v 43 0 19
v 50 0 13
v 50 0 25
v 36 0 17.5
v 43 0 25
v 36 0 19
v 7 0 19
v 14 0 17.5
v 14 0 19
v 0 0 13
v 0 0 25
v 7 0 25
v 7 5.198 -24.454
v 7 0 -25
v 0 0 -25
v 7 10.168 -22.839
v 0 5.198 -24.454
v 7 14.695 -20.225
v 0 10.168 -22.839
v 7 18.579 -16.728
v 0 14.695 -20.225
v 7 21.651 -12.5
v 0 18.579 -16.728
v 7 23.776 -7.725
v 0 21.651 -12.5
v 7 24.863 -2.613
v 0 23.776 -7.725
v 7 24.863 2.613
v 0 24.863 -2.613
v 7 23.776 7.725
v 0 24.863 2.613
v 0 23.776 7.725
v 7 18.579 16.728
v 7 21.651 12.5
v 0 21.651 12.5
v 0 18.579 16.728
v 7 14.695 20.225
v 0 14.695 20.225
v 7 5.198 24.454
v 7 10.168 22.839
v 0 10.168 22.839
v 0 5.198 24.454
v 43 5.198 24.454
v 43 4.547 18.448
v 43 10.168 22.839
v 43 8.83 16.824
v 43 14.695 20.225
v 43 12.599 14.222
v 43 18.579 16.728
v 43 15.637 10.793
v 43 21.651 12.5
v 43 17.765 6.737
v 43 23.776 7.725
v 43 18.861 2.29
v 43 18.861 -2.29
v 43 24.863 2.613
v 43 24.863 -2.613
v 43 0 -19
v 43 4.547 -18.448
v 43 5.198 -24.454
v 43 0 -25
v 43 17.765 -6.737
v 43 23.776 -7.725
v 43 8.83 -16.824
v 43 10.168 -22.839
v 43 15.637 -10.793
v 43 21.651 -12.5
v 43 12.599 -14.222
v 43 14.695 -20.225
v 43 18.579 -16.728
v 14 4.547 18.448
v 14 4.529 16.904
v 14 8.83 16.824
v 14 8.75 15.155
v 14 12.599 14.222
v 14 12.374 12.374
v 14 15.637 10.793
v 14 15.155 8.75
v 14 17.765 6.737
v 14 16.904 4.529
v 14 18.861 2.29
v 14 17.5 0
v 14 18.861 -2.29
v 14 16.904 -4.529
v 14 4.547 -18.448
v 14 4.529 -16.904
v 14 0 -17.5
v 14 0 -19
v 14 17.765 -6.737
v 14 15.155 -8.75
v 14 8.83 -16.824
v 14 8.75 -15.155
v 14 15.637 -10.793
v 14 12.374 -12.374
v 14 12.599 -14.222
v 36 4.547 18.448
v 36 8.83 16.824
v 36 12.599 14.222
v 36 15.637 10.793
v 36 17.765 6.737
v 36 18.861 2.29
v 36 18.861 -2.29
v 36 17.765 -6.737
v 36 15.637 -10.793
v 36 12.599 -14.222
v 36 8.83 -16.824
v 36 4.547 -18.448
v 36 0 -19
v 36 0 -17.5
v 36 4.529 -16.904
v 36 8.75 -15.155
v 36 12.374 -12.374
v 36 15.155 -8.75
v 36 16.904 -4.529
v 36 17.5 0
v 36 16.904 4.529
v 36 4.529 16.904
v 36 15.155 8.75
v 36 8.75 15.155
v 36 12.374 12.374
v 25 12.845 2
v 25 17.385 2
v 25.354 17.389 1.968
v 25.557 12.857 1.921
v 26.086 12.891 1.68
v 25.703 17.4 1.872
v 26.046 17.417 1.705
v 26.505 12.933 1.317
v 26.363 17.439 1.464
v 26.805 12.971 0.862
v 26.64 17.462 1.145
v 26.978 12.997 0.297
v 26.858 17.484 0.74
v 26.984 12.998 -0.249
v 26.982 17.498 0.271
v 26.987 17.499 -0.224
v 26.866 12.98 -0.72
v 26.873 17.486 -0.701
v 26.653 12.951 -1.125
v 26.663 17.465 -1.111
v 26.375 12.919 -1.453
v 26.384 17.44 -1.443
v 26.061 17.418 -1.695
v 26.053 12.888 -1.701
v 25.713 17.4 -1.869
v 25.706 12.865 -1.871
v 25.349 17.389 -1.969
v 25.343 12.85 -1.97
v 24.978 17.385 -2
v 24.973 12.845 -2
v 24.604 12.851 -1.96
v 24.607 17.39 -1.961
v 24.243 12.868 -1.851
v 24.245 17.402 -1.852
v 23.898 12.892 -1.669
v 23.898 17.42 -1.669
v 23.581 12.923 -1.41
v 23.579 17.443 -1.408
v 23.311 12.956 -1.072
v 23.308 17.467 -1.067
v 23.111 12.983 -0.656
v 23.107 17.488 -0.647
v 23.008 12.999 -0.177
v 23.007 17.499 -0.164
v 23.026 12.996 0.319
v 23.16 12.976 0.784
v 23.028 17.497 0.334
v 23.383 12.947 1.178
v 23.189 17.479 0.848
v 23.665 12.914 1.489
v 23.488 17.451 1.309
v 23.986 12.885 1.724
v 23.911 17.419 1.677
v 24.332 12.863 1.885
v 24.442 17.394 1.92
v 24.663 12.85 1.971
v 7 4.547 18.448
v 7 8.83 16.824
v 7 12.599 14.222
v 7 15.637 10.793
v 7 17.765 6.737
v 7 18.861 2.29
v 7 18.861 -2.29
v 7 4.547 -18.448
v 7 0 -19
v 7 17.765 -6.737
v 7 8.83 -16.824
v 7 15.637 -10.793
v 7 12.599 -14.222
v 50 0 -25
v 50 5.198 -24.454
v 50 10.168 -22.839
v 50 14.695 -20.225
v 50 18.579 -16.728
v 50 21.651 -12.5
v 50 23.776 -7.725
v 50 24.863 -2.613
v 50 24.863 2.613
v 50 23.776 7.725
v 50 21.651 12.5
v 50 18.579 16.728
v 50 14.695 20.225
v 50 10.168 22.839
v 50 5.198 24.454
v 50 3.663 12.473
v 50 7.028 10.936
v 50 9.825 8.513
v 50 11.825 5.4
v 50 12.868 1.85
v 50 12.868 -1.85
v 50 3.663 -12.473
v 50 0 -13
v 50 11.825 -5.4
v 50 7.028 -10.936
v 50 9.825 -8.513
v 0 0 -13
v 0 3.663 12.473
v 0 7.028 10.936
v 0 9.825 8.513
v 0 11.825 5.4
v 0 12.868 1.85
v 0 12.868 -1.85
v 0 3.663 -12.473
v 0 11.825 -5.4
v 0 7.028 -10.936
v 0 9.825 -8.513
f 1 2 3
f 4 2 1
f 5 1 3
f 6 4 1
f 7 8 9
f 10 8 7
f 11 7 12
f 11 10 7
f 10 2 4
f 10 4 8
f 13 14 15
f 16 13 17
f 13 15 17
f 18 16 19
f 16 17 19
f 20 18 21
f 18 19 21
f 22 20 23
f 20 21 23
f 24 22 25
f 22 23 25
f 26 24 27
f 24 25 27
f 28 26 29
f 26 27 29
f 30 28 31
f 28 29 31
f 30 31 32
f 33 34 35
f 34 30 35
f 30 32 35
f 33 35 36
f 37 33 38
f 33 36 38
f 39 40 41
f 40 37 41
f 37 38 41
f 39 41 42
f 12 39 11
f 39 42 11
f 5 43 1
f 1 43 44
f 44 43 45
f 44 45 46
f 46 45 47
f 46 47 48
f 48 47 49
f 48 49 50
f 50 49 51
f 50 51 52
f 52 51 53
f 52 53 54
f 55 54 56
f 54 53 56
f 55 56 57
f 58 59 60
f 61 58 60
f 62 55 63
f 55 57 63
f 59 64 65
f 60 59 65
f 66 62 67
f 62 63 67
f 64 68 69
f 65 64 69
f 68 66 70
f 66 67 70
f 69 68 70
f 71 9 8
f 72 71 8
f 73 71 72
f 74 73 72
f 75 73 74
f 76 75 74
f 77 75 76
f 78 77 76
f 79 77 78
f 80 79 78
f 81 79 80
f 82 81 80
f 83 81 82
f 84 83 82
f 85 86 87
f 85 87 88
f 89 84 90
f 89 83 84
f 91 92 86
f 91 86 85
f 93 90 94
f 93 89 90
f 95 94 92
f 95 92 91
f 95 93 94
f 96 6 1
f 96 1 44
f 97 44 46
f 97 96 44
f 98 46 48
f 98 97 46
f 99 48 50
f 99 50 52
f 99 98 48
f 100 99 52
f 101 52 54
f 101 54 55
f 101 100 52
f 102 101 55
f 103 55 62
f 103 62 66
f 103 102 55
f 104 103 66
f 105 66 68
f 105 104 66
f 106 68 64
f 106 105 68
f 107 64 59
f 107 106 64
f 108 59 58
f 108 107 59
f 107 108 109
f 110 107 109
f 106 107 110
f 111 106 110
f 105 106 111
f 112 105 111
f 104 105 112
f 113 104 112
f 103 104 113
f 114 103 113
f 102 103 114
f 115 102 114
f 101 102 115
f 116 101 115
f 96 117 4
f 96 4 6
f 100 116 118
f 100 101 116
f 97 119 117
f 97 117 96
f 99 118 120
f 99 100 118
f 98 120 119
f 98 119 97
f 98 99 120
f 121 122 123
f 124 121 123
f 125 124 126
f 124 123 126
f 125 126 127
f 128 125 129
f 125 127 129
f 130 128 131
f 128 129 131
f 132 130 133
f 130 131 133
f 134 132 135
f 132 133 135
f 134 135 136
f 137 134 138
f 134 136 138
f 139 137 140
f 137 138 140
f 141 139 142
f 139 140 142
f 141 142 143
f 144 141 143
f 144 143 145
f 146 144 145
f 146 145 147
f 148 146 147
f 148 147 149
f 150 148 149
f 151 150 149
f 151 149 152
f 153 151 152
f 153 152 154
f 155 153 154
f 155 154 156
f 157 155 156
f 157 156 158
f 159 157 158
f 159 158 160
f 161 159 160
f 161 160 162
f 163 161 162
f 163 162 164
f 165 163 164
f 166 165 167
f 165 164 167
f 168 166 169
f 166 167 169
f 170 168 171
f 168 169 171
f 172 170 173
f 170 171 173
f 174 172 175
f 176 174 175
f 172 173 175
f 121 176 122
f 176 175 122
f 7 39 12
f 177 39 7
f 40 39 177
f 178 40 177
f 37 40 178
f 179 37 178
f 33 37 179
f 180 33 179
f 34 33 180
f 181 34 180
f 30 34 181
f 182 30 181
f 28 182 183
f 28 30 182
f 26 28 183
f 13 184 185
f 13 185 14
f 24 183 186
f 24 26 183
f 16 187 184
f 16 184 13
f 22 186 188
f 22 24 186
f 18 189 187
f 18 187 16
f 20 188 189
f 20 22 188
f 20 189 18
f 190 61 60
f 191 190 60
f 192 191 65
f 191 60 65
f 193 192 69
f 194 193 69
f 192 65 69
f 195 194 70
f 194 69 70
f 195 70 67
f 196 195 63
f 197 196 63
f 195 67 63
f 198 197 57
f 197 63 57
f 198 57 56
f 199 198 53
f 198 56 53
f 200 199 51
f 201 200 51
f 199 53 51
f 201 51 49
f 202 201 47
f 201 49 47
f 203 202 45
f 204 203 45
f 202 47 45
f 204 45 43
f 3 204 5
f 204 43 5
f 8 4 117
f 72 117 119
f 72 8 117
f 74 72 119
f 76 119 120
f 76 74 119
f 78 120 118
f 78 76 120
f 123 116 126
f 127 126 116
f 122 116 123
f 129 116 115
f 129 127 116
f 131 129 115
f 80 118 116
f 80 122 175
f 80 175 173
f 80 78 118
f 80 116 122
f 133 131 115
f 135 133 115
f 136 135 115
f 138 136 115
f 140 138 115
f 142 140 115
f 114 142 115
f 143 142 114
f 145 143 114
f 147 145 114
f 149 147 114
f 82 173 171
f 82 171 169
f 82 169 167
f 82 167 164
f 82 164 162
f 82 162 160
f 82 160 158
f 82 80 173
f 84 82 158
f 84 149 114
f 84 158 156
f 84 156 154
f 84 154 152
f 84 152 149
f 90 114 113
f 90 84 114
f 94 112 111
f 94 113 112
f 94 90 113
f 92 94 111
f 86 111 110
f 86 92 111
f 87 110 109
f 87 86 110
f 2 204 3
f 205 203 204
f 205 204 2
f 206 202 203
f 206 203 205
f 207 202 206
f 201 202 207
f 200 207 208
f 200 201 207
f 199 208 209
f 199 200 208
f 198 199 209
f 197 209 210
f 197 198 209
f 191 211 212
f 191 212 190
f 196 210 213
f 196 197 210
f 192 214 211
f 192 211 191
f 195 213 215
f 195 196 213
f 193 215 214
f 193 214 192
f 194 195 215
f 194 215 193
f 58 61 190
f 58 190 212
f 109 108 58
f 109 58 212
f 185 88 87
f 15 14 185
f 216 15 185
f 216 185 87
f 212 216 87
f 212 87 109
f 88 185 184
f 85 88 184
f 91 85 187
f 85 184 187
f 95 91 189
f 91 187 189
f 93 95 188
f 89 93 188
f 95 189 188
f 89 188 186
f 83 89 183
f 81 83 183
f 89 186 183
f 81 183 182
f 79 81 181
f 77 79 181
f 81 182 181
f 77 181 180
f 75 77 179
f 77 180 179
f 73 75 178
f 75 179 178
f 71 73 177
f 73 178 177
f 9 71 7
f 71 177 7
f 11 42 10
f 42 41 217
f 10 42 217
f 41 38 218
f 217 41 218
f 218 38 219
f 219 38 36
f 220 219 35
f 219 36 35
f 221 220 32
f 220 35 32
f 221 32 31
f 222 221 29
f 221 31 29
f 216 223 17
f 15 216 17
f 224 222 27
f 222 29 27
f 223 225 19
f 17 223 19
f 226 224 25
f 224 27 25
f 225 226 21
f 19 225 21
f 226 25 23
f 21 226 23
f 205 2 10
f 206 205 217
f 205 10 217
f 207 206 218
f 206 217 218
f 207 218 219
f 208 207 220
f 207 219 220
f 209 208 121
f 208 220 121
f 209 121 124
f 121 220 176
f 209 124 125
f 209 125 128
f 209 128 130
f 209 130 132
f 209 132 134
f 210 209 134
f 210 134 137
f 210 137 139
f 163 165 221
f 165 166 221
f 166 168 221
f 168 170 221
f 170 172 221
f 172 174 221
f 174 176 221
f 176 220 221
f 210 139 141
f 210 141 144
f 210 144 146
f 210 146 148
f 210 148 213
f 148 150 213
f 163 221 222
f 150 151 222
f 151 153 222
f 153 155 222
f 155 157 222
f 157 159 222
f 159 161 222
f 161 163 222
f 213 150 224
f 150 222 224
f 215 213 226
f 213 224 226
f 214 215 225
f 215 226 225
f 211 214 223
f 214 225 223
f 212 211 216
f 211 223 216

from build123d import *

# Parameters (mm, degrees)
BOSS_EXTRUDE4_DEPTH     = 50
CUT_EXTRUDE_THIN1_DEPTH = 50
BOSS_EXTRUDE6_DEPTH     = 7
BOSS_EXTRUDE8_START     = -7
BOSS_EXTRUDE8_DEPTH     = 7
BOSS_EXTRUDE9_START     = 7
BOSS_EXTRUDE9_DEPTH     = 7
SKETCH10_R              = 2
CUT_EXTRUDE1_DEPTH      = 59.576872569


with BuildPart() as part:
    # Sketch1 → Boss-Extrude4 (new body)
    with BuildSketch(Plane(origin=(0, 0, 0), x_dir=(0, 0, -1), z_dir=(1, 0, 0))):
        with BuildLine():
            Line((-25, 0), (-13, 0))
            ThreePointArc((-13, 0), (0, 13), (13, 0))
            Line((13, 0), (25, 0))
            ThreePointArc((25, 0), (0, 25), (-25, 0))
        make_face()
    extrude(amount=BOSS_EXTRUDE4_DEPTH)

    # Sketch4 → Cut-Extrude-Thin1 (cut)
    with BuildSketch(Plane.ZY.offset(-7)):
        with BuildLine():
            ThreePointArc((17.5, 0), (0, 17.5), (-17.5, 0))
            Line((-17.5, 0), (-27.5, 0))
            ThreePointArc((-27.5, 0), (0, 27.5), (27.5, 0))
            Line((27.5, 0), (17.5, 0))
        make_face()
    extrude(amount=-CUT_EXTRUDE_THIN1_DEPTH, mode=Mode.SUBTRACT)

    # Sketch5 → Boss-Extrude6 (add)
    with BuildSketch(Plane(origin=(7, 0, 0), x_dir=(0, 0, -1), z_dir=(1, 0, 0))):
        with BuildLine():
            Line((-19, 0), (-17.5, 0))
            ThreePointArc((-17.5, 0), (0, 17.5), (17.5, 0))
            Line((17.5, 0), (19, 0))
            ThreePointArc((19, 0), (0, 19), (-19, 0))
        make_face()
    extrude(amount=BOSS_EXTRUDE6_DEPTH)

    # Sketch8 → Boss-Extrude8 (add)
    with BuildSketch(Plane(origin=(50, 0, 0), x_dir=(0, 0, -1), z_dir=(1, 0, 0)).offset(BOSS_EXTRUDE8_START)):
        with BuildLine():
            Line((-25, 0), (-17.5, 0))
            ThreePointArc((-17.5, 0), (0, 17.5), (17.5, 0))
            Line((17.5, 0), (25, 0))
            ThreePointArc((25, 0), (0, 25), (-25, 0))
        make_face()
    extrude(amount=BOSS_EXTRUDE8_DEPTH)

    # Sketch9 → Boss-Extrude9 (add)
    with BuildSketch(Plane.ZY.offset(-43).offset(BOSS_EXTRUDE9_START)):
        with BuildLine():
            Line((-19, 0), (-17.5, 0))
            ThreePointArc((-17.5, 0), (0, 17.5), (17.5, 0))
            Line((17.5, 0), (19, 0))
            ThreePointArc((19, 0), (0, 19), (-19, 0))
        make_face()
    extrude(amount=-BOSS_EXTRUDE9_DEPTH)

    # Sketch10 → Cut-Extrude1 (cut, through all)
    with BuildSketch(Plane(origin=(0, 17.5, 0), x_dir=(1, 0, 0), z_dir=(0, 1, 0))):
        with Locations(Location((25, 0, 0), (0, 0, 270))):
            Circle(SKETCH10_R)
    extrude(amount=-CUT_EXTRUDE1_DEPTH, mode=Mode.SUBTRACT)


solid = part.part
